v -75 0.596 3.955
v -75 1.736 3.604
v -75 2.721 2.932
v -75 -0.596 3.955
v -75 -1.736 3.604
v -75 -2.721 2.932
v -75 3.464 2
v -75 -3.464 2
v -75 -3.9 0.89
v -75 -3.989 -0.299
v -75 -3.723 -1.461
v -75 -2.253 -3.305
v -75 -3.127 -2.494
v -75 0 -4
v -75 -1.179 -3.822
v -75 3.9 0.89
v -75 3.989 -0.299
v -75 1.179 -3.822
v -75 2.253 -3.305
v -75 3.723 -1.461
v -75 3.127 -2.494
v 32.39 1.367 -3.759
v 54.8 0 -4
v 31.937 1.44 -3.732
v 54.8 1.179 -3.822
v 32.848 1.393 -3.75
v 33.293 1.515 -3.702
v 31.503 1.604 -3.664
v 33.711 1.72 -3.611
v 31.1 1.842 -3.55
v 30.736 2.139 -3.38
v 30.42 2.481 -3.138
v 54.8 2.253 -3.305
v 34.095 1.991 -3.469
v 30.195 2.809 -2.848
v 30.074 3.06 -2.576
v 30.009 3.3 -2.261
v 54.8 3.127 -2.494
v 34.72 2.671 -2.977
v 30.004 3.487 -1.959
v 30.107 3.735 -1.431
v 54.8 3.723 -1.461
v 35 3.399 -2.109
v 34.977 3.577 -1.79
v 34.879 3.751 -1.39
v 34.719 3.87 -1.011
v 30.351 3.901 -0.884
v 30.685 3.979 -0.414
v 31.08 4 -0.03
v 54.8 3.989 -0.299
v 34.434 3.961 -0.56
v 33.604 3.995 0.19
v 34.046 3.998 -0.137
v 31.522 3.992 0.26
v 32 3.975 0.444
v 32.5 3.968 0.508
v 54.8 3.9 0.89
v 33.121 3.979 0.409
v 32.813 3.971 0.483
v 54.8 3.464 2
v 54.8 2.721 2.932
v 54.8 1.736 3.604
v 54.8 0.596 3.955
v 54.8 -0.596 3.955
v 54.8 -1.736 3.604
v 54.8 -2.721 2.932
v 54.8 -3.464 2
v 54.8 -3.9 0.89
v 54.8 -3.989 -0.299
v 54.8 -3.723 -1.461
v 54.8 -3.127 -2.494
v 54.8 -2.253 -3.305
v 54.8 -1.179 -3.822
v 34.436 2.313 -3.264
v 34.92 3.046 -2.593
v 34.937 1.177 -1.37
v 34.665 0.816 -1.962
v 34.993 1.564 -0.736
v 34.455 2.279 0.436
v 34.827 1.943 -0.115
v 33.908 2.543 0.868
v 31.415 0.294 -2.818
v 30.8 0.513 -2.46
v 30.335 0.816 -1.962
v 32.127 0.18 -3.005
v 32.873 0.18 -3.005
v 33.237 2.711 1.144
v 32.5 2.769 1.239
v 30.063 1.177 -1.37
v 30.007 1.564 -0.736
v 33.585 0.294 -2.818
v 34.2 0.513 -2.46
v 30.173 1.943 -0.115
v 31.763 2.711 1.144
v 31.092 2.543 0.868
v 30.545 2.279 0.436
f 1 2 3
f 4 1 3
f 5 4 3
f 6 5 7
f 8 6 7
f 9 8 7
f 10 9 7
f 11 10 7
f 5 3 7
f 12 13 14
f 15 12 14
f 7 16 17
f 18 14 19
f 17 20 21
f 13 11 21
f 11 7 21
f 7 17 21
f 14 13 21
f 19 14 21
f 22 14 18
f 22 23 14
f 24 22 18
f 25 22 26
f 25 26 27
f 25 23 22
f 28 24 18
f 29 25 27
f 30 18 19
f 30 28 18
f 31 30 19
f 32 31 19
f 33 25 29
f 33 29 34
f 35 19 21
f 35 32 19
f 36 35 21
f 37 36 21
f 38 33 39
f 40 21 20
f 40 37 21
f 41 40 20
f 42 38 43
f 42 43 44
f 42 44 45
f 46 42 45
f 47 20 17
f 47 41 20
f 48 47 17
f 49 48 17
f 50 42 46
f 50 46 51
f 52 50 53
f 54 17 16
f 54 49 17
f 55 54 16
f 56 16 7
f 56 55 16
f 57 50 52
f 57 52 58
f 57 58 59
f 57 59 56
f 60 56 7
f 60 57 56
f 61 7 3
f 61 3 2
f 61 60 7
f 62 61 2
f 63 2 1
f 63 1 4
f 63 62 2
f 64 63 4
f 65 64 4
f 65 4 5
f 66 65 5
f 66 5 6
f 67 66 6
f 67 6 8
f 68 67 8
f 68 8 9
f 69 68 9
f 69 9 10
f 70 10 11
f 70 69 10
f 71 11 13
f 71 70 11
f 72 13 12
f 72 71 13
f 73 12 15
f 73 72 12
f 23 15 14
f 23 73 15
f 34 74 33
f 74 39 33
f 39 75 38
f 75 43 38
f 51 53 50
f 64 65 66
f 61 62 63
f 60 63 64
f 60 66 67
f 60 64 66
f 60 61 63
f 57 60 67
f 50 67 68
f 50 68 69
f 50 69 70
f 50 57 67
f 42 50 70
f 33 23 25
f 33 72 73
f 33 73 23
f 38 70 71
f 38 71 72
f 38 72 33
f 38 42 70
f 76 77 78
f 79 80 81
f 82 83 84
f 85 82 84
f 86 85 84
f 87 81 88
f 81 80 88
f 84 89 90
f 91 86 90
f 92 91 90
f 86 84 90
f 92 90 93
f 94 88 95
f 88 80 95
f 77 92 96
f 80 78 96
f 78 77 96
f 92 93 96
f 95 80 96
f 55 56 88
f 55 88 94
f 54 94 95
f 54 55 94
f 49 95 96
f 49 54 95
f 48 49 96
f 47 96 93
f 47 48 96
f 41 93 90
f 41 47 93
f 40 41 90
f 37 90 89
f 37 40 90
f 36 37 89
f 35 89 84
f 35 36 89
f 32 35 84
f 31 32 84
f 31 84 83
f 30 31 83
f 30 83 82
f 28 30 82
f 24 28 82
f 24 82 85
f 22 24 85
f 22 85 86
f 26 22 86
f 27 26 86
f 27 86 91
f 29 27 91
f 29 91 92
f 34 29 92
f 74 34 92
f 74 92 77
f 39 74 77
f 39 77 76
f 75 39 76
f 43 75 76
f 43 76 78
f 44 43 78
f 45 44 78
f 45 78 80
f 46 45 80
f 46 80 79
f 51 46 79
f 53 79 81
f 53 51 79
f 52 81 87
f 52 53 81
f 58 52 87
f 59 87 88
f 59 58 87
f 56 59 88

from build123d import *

# Parameters (mm, degrees)
SKETCH1_R           = 4
BOSS_EXTRUDE1_DEPTH = 75
SKETCH2_R           = 2.5
CUT_EXTRUDE1_DEPTH  = 1097
SKETCH3_W           = 40.4
SKETCH3_H           = 41.541480206
CUT_EXTRUDE2_DEPTH  = 5


with BuildPart() as part:
    # Sketch1 → Boss-Extrude1 (new body, symmetric)
    with BuildSketch(Plane(origin=(0, 0, 0), x_dir=(0, 0, -1), z_dir=(1, 0, 0))):
        Circle(SKETCH1_R)
    extrude(amount=BOSS_EXTRUDE1_DEPTH, both=True)

    # Sketch2 → Cut-Extrude1 (cut)
    with BuildSketch(Plane(origin=(-1373.627106081, 398.034078038, -1457.249478015), x_dir=(0, 0.520791654, 0.853683813), z_dir=(0, -0.853683813, 0.520791654))):
        with Locations((1036.737465208, -1406.127106081)):
            Circle(SKETCH2_R)
    extrude(amount=CUT_EXTRUDE1_DEPTH, mode=Mode.SUBTRACT)

    # Sketch3 → Cut-Extrude2 (cut, symmetric)
    with BuildSketch(Plane(origin=(0, 0, 0), x_dir=(1, 0, 0), z_dir=(0, 1, 0))):
        with Locations((75, 4)):
            Rectangle(SKETCH3_W, SKETCH3_H)
    extrude(amount=CUT_EXTRUDE2_DEPTH, both=True, mode=Mode.SUBTRACT)


solid = part.part
